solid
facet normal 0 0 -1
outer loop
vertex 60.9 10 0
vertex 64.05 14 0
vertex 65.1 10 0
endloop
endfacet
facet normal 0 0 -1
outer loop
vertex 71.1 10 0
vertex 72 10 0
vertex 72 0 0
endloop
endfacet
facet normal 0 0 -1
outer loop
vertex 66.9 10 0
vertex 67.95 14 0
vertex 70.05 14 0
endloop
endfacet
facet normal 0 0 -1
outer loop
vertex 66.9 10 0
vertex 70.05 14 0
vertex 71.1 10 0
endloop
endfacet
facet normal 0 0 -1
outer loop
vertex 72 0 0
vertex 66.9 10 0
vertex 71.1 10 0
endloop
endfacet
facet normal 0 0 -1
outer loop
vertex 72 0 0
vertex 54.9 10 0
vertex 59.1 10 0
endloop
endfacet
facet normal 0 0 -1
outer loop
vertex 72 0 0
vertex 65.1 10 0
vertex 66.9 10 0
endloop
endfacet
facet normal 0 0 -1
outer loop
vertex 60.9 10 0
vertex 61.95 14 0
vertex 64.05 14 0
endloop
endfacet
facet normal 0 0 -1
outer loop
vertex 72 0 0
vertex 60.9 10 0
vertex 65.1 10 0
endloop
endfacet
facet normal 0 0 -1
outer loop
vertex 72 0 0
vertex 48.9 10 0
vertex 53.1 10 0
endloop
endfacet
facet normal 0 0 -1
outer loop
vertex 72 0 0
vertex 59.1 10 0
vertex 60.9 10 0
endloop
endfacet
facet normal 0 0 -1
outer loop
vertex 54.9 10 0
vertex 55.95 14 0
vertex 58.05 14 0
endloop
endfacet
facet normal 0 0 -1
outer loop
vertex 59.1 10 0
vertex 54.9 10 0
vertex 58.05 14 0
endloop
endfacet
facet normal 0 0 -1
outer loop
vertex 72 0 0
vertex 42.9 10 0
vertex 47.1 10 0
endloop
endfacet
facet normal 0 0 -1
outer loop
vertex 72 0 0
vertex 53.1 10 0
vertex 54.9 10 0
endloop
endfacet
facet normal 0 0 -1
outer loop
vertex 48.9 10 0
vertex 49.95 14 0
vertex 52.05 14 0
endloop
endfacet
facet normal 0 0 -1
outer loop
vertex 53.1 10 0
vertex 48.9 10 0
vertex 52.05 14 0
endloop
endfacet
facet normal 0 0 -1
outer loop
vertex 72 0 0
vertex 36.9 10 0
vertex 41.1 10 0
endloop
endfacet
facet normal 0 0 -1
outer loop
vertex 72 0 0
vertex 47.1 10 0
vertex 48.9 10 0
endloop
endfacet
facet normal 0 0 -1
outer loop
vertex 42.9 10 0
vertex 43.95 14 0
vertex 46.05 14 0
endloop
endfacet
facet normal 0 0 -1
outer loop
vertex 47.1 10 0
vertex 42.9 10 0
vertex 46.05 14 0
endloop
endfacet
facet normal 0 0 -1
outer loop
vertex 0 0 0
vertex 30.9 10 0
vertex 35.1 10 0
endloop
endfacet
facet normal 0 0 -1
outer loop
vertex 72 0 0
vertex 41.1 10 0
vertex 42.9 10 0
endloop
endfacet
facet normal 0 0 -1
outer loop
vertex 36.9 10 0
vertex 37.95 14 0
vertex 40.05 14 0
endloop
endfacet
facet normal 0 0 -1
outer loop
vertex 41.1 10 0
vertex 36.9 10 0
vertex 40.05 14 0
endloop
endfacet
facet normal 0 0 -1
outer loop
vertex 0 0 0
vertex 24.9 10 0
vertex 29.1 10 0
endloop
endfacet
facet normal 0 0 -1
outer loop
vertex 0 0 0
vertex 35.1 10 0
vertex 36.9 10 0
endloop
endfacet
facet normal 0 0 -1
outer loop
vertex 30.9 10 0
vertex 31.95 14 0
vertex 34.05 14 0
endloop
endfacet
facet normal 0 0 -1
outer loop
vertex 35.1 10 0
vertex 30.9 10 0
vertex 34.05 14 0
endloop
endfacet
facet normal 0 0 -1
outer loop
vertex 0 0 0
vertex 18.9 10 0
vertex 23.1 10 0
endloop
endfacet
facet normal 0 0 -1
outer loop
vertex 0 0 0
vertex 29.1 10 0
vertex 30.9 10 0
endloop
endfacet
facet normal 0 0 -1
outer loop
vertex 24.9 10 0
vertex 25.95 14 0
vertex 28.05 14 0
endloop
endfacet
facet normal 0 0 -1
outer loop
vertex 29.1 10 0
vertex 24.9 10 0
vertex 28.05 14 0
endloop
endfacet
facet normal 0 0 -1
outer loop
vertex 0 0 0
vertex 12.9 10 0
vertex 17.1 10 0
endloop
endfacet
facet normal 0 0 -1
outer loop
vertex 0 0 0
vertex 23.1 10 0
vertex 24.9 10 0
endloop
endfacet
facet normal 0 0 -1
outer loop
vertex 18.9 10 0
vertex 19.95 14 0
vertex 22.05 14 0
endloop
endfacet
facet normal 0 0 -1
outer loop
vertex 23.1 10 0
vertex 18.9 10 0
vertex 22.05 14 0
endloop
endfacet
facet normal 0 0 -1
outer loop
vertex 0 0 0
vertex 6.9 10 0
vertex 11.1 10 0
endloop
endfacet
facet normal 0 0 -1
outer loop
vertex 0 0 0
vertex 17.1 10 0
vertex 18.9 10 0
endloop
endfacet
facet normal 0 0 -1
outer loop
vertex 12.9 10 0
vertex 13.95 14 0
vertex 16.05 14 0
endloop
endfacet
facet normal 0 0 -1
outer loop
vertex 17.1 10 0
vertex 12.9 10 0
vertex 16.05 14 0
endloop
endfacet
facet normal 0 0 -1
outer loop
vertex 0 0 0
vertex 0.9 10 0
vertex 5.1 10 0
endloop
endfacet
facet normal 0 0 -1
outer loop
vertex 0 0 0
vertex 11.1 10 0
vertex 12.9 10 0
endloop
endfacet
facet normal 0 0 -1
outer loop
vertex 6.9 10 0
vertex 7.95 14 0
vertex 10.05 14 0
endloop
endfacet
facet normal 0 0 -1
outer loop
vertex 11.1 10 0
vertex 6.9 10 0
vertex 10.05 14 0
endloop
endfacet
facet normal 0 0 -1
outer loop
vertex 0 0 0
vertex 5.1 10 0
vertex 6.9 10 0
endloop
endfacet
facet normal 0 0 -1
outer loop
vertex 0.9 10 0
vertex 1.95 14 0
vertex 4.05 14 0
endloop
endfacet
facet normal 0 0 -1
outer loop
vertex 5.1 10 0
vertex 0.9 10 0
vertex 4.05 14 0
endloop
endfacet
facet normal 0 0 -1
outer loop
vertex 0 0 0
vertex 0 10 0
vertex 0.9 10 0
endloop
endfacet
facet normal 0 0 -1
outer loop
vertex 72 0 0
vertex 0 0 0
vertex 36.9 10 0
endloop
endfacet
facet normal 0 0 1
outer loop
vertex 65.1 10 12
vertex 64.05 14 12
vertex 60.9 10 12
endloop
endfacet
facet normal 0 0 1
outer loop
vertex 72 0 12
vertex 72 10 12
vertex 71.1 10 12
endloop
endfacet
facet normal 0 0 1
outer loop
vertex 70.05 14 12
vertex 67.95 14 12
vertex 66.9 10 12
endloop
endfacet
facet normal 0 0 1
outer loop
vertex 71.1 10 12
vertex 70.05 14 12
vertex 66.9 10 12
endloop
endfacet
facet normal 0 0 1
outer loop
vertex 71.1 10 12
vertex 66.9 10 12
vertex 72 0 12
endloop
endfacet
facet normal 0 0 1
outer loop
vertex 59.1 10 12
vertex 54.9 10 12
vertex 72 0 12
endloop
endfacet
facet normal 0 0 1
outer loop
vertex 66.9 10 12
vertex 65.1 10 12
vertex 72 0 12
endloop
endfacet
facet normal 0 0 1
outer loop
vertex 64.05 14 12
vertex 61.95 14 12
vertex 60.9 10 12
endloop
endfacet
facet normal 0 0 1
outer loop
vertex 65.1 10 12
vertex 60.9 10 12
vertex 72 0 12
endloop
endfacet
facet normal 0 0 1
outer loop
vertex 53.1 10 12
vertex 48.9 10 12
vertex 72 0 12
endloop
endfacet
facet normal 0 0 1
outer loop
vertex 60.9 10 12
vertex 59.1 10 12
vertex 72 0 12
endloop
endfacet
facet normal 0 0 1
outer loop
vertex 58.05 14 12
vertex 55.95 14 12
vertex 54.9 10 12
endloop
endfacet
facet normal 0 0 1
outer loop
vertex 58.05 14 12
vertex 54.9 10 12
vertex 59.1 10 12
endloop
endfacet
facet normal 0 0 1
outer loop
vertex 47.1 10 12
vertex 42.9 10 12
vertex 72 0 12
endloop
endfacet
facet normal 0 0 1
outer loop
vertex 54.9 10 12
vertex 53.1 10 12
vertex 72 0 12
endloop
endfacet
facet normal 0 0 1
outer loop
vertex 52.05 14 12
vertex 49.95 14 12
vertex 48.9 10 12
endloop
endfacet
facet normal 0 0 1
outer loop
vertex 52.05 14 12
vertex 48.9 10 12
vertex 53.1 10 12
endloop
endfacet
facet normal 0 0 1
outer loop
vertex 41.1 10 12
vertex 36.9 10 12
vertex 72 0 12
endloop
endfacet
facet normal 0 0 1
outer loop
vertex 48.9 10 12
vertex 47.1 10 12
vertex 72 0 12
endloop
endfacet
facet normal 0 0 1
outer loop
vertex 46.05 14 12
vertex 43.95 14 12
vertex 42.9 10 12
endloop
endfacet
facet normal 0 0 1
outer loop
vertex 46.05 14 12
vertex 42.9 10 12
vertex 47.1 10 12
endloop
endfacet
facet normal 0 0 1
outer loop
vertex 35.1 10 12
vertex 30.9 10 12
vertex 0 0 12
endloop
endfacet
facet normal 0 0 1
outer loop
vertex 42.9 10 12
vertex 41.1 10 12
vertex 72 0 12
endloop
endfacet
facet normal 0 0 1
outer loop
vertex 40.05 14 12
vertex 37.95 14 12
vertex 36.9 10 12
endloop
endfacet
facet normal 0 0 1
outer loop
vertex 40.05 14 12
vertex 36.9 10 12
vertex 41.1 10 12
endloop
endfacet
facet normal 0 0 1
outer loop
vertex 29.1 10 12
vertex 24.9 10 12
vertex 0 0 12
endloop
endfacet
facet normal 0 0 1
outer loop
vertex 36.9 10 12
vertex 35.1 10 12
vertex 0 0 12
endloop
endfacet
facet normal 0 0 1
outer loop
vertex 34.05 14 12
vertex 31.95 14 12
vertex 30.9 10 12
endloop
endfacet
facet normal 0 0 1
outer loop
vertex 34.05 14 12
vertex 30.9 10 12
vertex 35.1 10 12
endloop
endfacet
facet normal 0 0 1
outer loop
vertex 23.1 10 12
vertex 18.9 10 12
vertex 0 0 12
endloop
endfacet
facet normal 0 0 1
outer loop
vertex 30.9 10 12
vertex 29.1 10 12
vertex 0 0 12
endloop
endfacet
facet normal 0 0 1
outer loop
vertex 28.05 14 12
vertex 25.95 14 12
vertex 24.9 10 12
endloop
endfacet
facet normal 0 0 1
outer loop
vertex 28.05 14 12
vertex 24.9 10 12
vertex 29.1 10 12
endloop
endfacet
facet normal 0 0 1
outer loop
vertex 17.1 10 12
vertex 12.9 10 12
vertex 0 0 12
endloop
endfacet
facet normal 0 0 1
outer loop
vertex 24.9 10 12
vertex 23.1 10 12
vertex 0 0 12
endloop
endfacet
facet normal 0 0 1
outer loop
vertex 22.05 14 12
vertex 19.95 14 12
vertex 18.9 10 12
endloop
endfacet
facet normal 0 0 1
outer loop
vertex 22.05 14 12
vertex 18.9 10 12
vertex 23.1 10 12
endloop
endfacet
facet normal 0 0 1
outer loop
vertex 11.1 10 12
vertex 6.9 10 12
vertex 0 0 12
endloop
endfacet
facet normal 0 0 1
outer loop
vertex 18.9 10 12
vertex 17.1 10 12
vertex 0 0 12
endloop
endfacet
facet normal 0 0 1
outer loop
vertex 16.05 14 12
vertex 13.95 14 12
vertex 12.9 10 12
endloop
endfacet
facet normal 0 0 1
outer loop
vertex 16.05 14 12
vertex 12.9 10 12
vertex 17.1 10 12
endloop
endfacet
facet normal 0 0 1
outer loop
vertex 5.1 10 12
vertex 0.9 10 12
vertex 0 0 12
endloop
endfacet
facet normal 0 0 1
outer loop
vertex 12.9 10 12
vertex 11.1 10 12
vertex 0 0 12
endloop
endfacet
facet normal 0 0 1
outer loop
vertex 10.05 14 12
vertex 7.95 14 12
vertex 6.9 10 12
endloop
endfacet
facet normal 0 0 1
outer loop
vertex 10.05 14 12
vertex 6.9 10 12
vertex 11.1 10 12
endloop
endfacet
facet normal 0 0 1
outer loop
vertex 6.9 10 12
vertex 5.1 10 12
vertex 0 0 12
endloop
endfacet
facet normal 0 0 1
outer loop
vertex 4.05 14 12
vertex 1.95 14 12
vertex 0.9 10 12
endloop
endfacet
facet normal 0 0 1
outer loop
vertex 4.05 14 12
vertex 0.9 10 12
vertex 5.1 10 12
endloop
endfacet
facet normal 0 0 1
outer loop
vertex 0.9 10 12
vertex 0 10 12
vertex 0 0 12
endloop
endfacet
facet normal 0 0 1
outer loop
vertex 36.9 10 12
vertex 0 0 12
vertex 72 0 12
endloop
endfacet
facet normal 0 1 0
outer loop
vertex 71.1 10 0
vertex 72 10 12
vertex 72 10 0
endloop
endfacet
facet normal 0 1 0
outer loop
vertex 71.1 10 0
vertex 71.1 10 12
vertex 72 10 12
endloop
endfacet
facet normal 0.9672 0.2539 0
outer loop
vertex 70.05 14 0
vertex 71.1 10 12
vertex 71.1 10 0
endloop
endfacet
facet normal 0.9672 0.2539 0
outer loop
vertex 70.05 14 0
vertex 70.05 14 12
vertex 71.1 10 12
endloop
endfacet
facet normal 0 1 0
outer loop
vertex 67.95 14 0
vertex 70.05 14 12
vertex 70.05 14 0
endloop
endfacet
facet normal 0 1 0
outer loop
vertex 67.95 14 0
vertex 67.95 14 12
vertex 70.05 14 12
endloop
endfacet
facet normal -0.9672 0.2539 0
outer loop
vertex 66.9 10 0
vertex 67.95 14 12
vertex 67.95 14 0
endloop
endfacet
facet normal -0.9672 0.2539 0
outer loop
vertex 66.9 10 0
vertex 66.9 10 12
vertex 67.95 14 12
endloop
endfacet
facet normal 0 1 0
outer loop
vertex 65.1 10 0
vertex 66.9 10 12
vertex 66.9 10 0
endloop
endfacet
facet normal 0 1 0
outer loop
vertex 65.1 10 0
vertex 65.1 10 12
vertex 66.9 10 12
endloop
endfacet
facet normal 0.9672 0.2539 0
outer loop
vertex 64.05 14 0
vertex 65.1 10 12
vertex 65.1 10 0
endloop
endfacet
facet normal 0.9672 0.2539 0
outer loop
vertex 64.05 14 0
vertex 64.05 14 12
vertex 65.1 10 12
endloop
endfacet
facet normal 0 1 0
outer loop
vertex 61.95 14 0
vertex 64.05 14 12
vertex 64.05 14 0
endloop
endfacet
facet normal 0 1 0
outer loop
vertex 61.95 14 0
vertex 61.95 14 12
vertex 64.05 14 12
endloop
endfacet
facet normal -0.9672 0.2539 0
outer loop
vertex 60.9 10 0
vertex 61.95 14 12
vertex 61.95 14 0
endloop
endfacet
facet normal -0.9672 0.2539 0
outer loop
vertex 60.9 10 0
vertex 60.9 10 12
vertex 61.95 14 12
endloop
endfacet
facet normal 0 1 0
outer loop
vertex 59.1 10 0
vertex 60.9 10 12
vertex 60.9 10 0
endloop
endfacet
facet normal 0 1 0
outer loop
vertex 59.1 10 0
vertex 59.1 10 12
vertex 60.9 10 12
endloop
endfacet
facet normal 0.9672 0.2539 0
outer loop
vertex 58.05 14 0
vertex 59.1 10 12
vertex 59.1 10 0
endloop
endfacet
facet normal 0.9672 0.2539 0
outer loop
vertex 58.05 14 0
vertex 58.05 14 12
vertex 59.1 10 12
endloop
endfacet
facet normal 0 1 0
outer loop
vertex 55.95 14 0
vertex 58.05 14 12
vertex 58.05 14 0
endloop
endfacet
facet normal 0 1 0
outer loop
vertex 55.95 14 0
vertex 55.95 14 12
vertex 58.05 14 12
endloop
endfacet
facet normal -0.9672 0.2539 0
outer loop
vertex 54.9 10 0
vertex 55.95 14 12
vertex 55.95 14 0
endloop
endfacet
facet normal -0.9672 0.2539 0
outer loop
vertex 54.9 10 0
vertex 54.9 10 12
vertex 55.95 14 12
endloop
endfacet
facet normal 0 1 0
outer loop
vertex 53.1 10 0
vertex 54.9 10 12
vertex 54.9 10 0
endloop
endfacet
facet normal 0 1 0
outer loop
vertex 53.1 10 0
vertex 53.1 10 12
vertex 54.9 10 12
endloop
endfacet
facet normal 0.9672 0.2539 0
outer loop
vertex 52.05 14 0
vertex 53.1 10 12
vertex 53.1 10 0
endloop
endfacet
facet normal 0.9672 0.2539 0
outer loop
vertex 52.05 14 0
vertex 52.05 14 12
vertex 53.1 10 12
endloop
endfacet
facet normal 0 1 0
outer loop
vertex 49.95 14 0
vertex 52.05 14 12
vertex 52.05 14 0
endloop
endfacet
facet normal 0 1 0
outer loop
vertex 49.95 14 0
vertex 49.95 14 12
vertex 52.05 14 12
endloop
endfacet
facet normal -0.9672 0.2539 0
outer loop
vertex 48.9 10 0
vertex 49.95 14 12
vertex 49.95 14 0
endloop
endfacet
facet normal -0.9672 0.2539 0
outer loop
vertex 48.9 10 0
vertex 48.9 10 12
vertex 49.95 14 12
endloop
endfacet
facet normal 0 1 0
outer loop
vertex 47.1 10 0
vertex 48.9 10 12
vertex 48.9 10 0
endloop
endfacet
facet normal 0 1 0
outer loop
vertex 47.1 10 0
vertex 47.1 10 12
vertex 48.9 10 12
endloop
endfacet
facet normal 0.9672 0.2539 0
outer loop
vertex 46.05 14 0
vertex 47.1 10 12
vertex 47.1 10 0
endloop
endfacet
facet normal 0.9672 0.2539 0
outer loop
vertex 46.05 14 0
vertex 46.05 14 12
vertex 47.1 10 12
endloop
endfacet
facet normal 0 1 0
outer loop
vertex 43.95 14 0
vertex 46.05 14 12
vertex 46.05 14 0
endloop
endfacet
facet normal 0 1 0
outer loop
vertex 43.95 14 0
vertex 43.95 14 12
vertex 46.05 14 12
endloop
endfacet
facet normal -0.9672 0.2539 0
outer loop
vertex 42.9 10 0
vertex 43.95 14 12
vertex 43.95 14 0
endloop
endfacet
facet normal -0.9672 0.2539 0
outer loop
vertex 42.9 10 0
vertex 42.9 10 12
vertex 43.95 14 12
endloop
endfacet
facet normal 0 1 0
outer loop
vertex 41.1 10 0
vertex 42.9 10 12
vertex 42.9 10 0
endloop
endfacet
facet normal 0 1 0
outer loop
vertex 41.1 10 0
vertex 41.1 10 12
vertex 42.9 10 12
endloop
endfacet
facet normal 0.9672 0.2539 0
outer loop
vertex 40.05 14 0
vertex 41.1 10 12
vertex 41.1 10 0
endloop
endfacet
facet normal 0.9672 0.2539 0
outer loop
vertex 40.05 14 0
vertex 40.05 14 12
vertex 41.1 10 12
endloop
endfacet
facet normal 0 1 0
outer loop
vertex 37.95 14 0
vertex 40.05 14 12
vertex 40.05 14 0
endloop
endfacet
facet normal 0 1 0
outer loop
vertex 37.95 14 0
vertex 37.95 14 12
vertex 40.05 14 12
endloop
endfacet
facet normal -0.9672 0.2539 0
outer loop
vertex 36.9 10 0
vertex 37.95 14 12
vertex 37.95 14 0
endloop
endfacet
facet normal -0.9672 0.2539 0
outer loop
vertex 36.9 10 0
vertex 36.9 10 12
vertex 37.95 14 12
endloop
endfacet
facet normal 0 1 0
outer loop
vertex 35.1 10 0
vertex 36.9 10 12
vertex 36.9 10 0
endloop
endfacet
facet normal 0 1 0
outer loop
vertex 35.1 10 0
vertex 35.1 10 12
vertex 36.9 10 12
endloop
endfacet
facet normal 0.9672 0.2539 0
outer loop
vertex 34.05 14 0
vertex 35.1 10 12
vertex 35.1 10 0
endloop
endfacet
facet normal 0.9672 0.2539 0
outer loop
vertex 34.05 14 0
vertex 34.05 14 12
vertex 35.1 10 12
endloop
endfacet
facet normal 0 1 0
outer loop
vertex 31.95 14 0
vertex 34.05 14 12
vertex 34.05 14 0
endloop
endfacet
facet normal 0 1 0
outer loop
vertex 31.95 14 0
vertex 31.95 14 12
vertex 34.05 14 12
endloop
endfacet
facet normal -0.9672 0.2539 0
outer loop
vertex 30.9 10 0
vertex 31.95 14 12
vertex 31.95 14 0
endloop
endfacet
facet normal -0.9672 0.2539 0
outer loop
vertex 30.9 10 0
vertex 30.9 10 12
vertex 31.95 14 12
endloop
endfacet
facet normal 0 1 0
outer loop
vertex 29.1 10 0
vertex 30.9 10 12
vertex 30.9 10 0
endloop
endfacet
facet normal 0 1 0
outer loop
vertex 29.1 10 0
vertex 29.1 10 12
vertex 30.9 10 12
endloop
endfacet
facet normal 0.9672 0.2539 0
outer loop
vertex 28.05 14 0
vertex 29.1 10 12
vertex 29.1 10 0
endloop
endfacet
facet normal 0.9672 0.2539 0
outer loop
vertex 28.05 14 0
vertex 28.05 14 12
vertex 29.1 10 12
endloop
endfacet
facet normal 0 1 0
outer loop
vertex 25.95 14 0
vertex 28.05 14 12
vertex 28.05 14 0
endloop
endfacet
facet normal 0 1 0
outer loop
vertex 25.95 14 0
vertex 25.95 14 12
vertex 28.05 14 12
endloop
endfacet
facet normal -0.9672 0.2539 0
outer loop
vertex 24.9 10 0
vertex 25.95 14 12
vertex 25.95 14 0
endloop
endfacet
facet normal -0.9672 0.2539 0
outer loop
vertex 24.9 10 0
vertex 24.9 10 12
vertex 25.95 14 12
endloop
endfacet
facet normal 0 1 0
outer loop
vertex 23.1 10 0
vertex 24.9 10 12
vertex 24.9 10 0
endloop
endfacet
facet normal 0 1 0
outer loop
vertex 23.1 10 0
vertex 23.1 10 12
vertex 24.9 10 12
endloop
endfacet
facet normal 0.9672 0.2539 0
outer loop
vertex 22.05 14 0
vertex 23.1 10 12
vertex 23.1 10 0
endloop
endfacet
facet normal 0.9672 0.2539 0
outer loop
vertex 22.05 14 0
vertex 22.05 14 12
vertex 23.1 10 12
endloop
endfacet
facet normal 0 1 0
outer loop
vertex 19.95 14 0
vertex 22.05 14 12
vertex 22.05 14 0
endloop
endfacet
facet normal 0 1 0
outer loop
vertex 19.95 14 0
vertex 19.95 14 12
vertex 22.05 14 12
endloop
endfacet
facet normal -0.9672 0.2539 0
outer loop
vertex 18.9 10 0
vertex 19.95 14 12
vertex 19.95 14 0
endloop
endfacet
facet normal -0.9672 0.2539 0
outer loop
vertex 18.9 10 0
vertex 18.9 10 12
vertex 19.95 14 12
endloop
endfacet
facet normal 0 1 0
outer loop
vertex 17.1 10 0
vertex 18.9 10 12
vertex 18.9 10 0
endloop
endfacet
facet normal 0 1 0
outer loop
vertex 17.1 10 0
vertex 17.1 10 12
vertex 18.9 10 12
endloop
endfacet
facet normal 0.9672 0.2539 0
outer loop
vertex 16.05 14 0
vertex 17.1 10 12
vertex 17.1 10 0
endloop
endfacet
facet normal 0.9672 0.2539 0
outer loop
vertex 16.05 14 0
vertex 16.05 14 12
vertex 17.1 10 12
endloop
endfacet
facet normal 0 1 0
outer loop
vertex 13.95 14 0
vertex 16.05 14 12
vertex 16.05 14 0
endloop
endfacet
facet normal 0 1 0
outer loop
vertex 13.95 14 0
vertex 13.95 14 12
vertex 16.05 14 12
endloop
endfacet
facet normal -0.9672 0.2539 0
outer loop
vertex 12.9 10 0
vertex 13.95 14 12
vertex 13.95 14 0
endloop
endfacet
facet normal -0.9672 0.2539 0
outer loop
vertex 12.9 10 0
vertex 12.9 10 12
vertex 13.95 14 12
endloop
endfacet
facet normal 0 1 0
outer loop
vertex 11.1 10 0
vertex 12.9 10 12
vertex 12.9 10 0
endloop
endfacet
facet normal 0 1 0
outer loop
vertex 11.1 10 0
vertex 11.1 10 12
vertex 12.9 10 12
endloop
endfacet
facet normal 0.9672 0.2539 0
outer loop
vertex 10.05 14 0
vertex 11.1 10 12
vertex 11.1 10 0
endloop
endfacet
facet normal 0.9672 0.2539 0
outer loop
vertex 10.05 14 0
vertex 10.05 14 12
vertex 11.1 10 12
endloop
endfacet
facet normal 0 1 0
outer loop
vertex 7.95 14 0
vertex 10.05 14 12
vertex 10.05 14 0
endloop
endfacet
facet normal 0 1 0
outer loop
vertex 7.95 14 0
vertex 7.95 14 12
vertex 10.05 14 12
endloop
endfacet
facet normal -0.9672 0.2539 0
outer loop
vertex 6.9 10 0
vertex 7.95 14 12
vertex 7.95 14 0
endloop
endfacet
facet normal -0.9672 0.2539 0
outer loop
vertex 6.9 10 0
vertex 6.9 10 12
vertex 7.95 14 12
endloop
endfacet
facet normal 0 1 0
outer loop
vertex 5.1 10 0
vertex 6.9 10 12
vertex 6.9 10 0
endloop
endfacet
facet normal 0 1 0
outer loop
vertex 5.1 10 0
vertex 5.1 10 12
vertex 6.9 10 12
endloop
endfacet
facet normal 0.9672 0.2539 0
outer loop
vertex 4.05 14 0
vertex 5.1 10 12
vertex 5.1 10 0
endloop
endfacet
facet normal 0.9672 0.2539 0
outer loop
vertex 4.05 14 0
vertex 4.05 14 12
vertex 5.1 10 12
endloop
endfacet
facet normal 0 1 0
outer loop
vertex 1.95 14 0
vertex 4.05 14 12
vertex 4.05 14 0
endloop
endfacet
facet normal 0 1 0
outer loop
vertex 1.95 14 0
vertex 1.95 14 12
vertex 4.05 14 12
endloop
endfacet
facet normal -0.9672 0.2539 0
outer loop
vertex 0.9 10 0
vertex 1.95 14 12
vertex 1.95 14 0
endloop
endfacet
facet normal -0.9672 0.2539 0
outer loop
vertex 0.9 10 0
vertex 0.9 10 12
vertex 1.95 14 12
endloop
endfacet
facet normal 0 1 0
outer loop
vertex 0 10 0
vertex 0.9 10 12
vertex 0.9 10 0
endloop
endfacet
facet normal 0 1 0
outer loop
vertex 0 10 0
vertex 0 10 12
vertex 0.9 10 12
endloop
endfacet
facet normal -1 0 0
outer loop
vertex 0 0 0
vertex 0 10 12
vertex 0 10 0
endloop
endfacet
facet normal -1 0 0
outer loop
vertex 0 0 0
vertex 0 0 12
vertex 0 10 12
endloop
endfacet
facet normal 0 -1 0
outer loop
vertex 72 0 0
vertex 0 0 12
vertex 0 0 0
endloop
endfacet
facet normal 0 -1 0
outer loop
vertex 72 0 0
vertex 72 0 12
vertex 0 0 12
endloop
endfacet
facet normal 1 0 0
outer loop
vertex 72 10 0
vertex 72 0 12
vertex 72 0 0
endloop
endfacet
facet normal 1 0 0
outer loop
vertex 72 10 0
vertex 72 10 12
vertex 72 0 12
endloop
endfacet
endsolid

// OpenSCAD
$fn = 32;

// ----------------------------------------------------------------------
// Gear rack: 12 teeth, pitch 6 mm
// ----------------------------------------------------------------------

// --- parameters (mm) ---
teeth = 12;               // number of teeth
pitch = 6;                // tooth pitch, X
root_w = 4.2;             // tooth width at the root
tip_w = 2.1;              // tooth width at the tip
base_h = 10;              // rack body height, Y
tooth_h = 4;              // tooth height above the body
plate_t = 12;             // rack width, Z (extrusion height)

rack_l = teeth * pitch;  // overall length
total_h = base_h + tooth_h;  // overall height

profile = [[0, 0], [72, 0], [72, 10], [71.1, 10], [70.05, 14], [67.95, 14], [66.9, 10], [65.1, 10], [64.05, 14], [61.95, 14], [60.9, 10], [59.1, 10], [58.05, 14], [55.95, 14], [54.9, 10], [53.1, 10], [52.05, 14], [49.95, 14], [48.9, 10], [47.1, 10], [46.05, 14], [43.95, 14], [42.9, 10], [41.1, 10], [40.05, 14], [37.95, 14], [36.9, 10], [35.1, 10], [34.05, 14], [31.95, 14], [30.9, 10], [29.1, 10], [28.05, 14], [25.95, 14], [24.9, 10], [23.1, 10], [22.05, 14], [19.95, 14], [18.9, 10], [17.1, 10], [16.05, 14], [13.95, 14], [12.9, 10], [11.1, 10], [10.05, 14], [7.95, 14], [6.9, 10], [5.1, 10], [4.05, 14], [1.95, 14], [0.9, 10], [0, 10]];  // primary outline, 52 points, counter clockwise

// --- the one profile operation ---
linear_extrude(height = plate_t) polygon(points = profile);
